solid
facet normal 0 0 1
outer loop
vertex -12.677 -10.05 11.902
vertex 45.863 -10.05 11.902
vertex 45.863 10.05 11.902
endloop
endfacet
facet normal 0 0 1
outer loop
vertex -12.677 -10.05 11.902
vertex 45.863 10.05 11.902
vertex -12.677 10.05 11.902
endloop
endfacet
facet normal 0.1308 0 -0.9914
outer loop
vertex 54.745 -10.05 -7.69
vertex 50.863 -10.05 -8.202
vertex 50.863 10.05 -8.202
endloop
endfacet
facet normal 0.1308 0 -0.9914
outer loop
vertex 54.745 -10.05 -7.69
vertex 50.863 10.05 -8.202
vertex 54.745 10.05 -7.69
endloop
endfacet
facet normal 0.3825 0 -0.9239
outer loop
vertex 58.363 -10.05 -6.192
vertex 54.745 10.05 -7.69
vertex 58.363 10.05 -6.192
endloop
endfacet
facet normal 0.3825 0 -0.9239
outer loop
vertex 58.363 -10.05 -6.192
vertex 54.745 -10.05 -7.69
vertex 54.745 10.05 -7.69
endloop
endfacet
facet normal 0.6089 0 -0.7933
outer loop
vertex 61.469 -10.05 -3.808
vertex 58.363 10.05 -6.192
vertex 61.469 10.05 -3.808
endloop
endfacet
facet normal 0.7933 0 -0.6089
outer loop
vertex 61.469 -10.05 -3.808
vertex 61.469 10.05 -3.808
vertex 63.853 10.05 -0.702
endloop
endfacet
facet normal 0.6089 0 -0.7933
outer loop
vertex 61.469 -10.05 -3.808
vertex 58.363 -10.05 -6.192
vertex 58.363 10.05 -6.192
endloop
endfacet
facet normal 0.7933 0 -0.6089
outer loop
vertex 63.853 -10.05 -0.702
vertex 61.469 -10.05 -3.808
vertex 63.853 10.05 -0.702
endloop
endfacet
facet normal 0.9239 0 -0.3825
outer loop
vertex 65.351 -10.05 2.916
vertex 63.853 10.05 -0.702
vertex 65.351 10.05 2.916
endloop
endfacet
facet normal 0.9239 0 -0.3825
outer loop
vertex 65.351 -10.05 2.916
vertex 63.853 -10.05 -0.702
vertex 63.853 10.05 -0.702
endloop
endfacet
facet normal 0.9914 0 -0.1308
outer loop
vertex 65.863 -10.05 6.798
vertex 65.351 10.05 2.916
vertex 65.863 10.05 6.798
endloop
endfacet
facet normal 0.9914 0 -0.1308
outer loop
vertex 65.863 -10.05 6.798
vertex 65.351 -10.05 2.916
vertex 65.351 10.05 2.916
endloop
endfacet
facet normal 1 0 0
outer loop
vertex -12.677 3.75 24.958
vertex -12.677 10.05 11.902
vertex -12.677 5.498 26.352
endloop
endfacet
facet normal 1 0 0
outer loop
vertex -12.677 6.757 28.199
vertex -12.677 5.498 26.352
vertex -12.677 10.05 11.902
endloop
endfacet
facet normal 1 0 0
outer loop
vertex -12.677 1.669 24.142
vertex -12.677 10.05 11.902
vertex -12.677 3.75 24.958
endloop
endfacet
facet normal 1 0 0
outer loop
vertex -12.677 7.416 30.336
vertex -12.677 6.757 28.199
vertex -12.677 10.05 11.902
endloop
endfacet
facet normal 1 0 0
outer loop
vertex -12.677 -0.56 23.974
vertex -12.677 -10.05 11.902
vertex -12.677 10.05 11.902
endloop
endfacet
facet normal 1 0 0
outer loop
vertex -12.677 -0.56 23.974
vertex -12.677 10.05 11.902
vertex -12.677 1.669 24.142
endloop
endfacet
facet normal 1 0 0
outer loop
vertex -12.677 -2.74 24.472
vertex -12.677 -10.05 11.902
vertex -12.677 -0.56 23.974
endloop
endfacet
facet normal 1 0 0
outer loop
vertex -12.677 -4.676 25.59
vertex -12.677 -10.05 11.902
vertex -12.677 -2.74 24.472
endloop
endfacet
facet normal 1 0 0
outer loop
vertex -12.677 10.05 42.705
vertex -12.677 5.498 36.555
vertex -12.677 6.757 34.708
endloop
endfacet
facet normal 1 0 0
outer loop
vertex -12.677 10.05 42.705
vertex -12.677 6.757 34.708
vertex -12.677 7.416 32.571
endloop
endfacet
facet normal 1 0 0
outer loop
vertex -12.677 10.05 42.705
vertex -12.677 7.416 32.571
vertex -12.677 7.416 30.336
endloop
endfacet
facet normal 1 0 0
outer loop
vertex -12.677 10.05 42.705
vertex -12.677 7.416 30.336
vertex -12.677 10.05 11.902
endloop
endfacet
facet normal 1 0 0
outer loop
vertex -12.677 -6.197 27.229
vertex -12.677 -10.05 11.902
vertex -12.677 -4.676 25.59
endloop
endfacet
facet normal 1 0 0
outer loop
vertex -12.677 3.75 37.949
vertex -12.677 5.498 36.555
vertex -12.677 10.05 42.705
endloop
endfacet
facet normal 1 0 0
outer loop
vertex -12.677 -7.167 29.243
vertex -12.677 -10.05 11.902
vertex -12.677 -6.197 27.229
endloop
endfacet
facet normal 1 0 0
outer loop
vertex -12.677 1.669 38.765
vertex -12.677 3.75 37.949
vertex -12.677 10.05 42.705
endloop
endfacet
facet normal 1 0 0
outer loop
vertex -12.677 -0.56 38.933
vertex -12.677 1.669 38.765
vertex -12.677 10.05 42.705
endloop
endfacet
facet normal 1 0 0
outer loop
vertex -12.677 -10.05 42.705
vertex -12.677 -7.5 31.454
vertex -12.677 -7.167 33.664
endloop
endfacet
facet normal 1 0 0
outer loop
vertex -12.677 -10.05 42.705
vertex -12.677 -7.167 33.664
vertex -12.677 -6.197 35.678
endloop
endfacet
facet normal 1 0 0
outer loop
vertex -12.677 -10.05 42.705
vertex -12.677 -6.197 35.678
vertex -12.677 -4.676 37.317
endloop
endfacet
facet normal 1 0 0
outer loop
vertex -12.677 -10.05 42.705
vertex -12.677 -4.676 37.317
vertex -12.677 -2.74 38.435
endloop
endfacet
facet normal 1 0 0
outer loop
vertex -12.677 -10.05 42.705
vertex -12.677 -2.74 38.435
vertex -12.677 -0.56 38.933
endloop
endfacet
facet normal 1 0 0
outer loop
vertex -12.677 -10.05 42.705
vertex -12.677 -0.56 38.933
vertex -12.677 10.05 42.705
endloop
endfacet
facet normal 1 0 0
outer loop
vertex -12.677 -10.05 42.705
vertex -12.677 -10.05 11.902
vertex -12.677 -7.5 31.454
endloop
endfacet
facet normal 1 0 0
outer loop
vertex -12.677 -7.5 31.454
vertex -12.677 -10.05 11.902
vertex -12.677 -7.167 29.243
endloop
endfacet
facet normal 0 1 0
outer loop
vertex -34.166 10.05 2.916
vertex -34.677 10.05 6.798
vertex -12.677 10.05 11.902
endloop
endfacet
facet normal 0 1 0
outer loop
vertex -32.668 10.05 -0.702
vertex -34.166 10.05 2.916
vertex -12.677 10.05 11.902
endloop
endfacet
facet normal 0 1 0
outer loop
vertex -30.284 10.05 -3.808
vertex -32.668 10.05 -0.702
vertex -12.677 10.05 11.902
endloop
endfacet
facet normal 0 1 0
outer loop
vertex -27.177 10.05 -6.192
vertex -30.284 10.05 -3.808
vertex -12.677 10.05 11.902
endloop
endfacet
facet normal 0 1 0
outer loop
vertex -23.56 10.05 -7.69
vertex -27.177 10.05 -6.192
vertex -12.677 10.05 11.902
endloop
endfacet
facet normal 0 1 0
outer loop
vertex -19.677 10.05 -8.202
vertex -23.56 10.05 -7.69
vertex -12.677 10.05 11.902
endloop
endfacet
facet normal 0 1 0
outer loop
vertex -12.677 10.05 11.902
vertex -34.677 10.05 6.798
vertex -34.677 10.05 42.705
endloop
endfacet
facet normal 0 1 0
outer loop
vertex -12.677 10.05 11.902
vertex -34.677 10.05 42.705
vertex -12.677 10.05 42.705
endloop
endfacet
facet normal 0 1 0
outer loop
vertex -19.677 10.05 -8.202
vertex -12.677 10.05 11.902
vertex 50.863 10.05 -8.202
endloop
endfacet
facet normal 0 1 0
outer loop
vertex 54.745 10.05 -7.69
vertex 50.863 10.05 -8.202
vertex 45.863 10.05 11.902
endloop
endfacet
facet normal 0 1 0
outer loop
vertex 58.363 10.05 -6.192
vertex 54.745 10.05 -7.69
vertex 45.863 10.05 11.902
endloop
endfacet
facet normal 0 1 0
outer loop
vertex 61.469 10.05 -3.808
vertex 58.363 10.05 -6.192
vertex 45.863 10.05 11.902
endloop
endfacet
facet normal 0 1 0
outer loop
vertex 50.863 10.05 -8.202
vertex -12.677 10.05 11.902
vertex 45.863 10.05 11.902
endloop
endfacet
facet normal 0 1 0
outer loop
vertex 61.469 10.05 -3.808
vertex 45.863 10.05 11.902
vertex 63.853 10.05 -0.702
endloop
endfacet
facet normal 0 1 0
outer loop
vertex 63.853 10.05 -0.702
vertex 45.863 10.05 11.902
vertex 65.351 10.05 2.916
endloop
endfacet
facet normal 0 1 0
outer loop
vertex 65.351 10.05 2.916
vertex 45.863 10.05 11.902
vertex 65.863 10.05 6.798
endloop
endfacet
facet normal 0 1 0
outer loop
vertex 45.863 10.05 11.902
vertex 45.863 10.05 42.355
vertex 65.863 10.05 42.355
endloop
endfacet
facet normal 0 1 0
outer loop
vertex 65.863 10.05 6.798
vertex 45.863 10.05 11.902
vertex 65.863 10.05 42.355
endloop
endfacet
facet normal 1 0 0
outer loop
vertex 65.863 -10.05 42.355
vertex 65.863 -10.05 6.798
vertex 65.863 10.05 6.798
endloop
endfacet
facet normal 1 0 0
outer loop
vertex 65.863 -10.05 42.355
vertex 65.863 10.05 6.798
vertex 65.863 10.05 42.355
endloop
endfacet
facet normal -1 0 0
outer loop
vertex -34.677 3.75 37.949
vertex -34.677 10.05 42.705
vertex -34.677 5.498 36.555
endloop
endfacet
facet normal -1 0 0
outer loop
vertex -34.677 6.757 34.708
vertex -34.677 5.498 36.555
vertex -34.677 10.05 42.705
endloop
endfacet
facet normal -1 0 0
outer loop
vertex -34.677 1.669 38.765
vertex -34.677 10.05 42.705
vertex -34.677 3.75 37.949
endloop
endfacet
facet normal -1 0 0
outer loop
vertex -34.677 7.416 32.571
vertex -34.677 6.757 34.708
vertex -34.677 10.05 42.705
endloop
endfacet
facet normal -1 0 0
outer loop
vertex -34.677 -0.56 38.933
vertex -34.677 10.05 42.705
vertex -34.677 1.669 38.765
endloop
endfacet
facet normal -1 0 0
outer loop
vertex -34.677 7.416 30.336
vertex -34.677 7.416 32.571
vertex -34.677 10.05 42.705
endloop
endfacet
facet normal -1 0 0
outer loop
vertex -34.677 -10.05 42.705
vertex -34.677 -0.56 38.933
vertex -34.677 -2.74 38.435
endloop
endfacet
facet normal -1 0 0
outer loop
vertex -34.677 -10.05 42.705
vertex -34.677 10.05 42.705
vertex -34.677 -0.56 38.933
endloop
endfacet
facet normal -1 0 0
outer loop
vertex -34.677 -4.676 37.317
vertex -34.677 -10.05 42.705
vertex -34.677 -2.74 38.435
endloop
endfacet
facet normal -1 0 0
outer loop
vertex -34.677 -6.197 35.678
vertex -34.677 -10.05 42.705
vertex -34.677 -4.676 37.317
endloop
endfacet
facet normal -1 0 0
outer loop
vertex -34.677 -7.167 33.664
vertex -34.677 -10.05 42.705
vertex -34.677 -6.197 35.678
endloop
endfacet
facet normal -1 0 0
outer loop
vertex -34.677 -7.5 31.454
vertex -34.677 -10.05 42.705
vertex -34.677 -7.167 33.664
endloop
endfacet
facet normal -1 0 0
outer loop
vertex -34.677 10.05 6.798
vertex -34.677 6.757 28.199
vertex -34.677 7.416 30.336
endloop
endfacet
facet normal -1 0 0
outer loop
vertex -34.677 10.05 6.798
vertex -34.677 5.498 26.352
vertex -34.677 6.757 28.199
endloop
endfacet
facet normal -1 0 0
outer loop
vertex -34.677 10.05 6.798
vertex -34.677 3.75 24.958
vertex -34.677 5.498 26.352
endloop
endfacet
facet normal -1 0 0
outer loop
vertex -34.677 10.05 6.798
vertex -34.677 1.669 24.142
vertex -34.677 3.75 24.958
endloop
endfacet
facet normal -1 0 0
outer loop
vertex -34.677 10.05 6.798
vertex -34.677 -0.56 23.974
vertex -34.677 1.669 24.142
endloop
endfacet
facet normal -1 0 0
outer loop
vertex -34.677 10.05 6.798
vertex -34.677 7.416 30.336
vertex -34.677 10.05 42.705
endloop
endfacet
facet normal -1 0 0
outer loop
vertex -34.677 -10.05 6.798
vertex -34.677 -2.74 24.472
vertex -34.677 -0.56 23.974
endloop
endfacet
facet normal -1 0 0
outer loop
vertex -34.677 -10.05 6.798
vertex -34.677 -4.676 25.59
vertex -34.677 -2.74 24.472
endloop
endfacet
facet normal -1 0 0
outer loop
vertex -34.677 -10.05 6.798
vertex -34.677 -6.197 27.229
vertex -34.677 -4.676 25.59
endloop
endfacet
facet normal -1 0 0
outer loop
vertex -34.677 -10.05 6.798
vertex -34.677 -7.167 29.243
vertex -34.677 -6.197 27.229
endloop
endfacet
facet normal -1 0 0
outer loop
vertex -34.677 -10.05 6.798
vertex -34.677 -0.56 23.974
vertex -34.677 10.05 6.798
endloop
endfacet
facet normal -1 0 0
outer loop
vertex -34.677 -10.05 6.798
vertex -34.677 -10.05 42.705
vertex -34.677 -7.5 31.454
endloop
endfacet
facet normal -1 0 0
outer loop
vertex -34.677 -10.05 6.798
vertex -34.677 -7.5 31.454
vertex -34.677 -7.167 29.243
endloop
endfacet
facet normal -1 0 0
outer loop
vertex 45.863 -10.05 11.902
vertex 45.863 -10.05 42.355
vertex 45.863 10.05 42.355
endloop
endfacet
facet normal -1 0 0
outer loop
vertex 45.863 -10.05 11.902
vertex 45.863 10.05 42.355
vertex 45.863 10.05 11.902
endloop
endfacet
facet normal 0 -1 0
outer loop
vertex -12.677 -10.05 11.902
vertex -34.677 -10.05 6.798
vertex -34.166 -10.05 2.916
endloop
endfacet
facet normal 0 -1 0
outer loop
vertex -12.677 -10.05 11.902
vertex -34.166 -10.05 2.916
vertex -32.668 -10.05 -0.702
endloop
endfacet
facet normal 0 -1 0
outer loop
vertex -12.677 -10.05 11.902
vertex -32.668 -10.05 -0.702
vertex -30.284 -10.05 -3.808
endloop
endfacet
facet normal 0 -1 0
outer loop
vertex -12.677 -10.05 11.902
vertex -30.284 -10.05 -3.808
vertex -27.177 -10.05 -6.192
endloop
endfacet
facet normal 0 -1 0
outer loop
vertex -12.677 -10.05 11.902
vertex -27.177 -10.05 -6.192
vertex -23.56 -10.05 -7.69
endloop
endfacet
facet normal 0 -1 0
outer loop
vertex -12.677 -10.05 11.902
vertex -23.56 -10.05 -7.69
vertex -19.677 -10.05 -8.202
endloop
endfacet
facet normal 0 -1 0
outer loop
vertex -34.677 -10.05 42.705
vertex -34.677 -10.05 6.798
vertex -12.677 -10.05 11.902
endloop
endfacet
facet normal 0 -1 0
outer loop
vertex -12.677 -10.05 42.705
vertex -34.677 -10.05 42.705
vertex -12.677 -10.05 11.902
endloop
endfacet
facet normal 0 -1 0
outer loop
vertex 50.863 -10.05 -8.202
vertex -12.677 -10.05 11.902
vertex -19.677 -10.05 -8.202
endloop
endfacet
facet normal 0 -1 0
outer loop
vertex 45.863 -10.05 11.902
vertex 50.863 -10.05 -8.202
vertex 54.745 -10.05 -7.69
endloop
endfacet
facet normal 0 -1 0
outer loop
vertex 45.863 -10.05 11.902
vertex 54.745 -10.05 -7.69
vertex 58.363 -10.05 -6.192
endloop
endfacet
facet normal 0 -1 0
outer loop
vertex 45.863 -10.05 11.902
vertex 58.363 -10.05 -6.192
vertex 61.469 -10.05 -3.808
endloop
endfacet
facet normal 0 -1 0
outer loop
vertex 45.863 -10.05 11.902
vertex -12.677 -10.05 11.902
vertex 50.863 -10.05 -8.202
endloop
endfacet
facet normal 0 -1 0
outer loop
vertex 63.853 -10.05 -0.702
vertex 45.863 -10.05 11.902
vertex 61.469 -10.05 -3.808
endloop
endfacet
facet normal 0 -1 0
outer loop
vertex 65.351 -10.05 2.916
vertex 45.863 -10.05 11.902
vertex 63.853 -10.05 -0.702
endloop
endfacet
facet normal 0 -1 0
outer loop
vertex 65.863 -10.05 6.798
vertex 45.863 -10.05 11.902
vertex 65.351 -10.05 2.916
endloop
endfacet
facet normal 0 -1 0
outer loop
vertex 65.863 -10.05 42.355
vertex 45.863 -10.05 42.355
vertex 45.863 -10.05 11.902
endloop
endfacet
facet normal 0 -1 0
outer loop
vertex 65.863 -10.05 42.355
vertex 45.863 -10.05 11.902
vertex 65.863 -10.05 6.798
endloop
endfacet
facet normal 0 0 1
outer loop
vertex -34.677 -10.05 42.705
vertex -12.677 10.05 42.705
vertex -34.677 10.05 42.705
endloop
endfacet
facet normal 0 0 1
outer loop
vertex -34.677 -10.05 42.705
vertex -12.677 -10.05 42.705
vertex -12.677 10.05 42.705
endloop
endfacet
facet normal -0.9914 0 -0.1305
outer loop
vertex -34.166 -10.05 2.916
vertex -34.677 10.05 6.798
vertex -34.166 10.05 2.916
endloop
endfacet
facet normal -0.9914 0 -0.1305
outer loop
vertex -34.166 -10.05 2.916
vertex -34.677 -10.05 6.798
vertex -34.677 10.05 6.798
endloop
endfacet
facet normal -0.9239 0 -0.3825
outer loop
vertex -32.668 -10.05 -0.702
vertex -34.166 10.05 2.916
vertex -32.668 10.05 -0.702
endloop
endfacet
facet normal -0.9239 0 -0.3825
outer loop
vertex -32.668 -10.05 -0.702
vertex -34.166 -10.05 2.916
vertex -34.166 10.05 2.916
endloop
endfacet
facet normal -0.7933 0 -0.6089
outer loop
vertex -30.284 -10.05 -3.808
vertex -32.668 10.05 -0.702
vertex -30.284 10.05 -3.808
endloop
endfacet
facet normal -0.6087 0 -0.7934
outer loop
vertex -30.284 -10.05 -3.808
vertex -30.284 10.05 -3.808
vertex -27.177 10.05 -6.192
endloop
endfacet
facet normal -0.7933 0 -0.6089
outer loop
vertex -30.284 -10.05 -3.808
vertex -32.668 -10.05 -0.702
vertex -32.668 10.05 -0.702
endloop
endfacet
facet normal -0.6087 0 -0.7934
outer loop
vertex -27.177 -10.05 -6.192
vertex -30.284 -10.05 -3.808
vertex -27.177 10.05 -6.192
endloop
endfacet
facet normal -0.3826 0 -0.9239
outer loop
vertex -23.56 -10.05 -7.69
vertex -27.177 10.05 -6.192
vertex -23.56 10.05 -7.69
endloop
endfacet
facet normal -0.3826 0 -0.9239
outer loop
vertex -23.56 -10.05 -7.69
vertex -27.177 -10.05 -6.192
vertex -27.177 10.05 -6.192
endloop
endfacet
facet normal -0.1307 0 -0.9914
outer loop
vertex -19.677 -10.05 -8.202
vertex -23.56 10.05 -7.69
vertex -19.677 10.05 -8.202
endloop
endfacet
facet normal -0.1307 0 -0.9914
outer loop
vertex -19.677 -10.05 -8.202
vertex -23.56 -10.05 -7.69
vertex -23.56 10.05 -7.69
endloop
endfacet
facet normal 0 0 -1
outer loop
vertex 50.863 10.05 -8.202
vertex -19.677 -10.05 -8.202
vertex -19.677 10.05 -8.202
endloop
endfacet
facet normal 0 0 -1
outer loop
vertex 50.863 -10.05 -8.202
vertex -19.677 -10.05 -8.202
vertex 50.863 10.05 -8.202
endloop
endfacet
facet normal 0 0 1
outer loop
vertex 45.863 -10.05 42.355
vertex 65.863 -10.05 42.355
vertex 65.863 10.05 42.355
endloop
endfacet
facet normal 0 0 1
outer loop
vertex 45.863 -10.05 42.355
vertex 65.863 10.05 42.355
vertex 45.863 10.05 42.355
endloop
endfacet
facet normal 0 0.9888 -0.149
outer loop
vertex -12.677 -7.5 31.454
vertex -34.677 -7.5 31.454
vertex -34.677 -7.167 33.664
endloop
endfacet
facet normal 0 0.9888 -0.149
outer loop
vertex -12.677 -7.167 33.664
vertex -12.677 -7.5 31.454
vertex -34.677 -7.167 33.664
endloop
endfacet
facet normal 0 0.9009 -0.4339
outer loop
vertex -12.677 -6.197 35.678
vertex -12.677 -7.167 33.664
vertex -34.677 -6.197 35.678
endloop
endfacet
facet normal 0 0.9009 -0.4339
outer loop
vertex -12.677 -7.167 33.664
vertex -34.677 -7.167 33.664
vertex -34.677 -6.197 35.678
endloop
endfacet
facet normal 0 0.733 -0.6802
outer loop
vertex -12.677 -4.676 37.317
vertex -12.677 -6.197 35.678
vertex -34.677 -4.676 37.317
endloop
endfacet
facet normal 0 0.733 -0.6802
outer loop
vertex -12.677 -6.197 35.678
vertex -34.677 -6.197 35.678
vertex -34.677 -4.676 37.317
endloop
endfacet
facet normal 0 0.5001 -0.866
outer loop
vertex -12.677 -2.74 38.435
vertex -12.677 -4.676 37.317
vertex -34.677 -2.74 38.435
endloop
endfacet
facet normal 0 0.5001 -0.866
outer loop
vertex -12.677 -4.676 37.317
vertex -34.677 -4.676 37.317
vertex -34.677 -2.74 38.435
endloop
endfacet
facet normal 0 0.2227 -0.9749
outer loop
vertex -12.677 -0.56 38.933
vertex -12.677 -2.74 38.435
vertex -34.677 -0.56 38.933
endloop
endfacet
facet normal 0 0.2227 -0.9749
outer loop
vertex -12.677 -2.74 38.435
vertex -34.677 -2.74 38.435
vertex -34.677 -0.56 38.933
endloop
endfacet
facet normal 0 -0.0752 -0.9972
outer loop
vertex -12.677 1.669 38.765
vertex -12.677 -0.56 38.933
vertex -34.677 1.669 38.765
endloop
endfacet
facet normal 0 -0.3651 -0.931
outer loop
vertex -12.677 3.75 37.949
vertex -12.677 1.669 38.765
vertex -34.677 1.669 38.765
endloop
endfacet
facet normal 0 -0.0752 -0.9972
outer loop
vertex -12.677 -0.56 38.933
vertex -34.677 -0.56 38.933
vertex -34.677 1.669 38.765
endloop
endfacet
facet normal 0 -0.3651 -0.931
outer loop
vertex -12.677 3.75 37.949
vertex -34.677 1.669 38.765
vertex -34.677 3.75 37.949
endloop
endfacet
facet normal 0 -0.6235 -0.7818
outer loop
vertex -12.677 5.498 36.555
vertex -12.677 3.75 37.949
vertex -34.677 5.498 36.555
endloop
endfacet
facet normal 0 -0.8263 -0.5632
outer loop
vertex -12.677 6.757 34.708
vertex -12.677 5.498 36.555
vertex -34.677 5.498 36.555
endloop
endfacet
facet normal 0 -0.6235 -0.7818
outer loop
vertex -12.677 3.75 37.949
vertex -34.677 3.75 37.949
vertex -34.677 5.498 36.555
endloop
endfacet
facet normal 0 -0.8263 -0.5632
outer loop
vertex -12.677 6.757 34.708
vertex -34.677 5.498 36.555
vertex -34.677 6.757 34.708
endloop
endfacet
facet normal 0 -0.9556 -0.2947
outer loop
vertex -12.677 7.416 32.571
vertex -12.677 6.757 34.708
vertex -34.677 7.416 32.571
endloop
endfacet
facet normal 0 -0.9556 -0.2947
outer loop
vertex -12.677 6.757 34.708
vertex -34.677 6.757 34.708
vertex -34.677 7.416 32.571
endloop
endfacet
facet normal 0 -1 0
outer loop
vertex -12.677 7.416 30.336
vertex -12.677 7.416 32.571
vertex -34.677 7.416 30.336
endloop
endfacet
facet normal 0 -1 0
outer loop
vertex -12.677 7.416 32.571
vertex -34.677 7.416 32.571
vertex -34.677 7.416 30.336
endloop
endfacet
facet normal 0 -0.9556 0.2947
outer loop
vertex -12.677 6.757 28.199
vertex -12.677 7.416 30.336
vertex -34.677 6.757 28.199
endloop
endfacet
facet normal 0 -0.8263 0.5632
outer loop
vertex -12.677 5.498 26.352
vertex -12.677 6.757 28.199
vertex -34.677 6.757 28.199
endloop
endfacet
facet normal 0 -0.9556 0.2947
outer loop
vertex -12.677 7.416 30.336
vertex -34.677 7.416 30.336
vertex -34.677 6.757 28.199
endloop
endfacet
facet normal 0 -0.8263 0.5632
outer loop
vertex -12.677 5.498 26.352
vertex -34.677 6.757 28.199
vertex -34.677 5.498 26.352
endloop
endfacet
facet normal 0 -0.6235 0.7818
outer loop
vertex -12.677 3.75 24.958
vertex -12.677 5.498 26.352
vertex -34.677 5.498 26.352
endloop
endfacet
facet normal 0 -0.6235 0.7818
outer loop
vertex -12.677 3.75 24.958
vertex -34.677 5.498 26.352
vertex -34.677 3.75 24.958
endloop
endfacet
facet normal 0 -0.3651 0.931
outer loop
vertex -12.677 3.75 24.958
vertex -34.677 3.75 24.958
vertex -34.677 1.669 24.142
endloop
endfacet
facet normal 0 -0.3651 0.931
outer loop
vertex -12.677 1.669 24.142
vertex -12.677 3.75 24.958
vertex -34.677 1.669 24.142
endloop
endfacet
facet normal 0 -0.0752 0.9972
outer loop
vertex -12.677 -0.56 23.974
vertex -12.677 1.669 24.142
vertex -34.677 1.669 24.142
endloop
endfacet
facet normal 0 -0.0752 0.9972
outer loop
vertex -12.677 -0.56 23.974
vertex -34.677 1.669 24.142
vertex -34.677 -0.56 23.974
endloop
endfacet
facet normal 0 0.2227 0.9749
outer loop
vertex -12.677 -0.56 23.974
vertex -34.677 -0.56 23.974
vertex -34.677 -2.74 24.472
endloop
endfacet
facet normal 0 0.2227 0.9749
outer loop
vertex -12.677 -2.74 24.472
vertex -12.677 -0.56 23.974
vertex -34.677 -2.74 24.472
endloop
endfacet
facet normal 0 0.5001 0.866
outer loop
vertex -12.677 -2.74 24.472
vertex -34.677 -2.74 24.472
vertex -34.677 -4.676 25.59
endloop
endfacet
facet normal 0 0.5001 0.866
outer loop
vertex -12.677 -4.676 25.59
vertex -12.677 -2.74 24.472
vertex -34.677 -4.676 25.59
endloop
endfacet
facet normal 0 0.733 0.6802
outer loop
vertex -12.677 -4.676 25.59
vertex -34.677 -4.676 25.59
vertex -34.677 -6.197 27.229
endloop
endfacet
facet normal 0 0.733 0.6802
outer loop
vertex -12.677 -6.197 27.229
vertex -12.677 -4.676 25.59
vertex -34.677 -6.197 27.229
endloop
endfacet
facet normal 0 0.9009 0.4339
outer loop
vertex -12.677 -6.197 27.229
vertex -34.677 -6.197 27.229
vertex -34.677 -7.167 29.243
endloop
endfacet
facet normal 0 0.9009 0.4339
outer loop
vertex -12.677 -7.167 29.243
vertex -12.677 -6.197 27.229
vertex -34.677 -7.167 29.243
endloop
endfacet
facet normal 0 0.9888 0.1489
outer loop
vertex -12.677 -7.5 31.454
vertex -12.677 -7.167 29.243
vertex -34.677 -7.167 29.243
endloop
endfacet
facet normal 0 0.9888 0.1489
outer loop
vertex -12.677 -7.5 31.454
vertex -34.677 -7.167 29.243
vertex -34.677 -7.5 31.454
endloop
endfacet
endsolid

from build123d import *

# Parameters (mm, degrees)
F1_DEPTH = 10.05
F2_R     = 7.5
F3_DEPTH = 25


with BuildPart() as f1:
    # F0 (on Front) → F1 (new body, symmetric)
    with BuildSketch(Plane.XZ):
        with BuildLine():
            ThreePointArc((-34.677416, 6.798443), (-30.284018, -3.808158), (-19.677416, -8.201557))
            Line((-19.677416, -8.201557), (50.862584, -8.201557))
            ThreePointArc((50.862584, -8.201557), (61.469185, -3.808158), (65.862584, 6.798443))
            Line((65.862584, 6.798443), (65.862584, 42.354545))
            Line((65.862584, 42.354545), (45.862584, 42.354545))
            Line((45.862584, 42.354545), (45.862584, 11.901609))
            Line((45.862584, 11.901609), (-12.677416, 11.901609))
            Line((-12.677416, 11.901609), (-12.677416, 42.704577))
            Line((-12.677416, 42.704577), (-34.677416, 42.704577))
            Line((-34.677416, 42.704577), (-34.677416, 6.798443))
        make_face()
    extrude(amount=F1_DEPTH, both=True)

    # F2 (on face) → F3 (cut)
    with BuildSketch(Plane(origin=(-34.677416, 0, 0), x_dir=(0, -1, 0), z_dir=(-1, 0, 0))):
        with Locations((0, 31.453513)):
            Circle(F2_R)
    extrude(amount=-F3_DEPTH, mode=Mode.SUBTRACT)


solid = f1.part
